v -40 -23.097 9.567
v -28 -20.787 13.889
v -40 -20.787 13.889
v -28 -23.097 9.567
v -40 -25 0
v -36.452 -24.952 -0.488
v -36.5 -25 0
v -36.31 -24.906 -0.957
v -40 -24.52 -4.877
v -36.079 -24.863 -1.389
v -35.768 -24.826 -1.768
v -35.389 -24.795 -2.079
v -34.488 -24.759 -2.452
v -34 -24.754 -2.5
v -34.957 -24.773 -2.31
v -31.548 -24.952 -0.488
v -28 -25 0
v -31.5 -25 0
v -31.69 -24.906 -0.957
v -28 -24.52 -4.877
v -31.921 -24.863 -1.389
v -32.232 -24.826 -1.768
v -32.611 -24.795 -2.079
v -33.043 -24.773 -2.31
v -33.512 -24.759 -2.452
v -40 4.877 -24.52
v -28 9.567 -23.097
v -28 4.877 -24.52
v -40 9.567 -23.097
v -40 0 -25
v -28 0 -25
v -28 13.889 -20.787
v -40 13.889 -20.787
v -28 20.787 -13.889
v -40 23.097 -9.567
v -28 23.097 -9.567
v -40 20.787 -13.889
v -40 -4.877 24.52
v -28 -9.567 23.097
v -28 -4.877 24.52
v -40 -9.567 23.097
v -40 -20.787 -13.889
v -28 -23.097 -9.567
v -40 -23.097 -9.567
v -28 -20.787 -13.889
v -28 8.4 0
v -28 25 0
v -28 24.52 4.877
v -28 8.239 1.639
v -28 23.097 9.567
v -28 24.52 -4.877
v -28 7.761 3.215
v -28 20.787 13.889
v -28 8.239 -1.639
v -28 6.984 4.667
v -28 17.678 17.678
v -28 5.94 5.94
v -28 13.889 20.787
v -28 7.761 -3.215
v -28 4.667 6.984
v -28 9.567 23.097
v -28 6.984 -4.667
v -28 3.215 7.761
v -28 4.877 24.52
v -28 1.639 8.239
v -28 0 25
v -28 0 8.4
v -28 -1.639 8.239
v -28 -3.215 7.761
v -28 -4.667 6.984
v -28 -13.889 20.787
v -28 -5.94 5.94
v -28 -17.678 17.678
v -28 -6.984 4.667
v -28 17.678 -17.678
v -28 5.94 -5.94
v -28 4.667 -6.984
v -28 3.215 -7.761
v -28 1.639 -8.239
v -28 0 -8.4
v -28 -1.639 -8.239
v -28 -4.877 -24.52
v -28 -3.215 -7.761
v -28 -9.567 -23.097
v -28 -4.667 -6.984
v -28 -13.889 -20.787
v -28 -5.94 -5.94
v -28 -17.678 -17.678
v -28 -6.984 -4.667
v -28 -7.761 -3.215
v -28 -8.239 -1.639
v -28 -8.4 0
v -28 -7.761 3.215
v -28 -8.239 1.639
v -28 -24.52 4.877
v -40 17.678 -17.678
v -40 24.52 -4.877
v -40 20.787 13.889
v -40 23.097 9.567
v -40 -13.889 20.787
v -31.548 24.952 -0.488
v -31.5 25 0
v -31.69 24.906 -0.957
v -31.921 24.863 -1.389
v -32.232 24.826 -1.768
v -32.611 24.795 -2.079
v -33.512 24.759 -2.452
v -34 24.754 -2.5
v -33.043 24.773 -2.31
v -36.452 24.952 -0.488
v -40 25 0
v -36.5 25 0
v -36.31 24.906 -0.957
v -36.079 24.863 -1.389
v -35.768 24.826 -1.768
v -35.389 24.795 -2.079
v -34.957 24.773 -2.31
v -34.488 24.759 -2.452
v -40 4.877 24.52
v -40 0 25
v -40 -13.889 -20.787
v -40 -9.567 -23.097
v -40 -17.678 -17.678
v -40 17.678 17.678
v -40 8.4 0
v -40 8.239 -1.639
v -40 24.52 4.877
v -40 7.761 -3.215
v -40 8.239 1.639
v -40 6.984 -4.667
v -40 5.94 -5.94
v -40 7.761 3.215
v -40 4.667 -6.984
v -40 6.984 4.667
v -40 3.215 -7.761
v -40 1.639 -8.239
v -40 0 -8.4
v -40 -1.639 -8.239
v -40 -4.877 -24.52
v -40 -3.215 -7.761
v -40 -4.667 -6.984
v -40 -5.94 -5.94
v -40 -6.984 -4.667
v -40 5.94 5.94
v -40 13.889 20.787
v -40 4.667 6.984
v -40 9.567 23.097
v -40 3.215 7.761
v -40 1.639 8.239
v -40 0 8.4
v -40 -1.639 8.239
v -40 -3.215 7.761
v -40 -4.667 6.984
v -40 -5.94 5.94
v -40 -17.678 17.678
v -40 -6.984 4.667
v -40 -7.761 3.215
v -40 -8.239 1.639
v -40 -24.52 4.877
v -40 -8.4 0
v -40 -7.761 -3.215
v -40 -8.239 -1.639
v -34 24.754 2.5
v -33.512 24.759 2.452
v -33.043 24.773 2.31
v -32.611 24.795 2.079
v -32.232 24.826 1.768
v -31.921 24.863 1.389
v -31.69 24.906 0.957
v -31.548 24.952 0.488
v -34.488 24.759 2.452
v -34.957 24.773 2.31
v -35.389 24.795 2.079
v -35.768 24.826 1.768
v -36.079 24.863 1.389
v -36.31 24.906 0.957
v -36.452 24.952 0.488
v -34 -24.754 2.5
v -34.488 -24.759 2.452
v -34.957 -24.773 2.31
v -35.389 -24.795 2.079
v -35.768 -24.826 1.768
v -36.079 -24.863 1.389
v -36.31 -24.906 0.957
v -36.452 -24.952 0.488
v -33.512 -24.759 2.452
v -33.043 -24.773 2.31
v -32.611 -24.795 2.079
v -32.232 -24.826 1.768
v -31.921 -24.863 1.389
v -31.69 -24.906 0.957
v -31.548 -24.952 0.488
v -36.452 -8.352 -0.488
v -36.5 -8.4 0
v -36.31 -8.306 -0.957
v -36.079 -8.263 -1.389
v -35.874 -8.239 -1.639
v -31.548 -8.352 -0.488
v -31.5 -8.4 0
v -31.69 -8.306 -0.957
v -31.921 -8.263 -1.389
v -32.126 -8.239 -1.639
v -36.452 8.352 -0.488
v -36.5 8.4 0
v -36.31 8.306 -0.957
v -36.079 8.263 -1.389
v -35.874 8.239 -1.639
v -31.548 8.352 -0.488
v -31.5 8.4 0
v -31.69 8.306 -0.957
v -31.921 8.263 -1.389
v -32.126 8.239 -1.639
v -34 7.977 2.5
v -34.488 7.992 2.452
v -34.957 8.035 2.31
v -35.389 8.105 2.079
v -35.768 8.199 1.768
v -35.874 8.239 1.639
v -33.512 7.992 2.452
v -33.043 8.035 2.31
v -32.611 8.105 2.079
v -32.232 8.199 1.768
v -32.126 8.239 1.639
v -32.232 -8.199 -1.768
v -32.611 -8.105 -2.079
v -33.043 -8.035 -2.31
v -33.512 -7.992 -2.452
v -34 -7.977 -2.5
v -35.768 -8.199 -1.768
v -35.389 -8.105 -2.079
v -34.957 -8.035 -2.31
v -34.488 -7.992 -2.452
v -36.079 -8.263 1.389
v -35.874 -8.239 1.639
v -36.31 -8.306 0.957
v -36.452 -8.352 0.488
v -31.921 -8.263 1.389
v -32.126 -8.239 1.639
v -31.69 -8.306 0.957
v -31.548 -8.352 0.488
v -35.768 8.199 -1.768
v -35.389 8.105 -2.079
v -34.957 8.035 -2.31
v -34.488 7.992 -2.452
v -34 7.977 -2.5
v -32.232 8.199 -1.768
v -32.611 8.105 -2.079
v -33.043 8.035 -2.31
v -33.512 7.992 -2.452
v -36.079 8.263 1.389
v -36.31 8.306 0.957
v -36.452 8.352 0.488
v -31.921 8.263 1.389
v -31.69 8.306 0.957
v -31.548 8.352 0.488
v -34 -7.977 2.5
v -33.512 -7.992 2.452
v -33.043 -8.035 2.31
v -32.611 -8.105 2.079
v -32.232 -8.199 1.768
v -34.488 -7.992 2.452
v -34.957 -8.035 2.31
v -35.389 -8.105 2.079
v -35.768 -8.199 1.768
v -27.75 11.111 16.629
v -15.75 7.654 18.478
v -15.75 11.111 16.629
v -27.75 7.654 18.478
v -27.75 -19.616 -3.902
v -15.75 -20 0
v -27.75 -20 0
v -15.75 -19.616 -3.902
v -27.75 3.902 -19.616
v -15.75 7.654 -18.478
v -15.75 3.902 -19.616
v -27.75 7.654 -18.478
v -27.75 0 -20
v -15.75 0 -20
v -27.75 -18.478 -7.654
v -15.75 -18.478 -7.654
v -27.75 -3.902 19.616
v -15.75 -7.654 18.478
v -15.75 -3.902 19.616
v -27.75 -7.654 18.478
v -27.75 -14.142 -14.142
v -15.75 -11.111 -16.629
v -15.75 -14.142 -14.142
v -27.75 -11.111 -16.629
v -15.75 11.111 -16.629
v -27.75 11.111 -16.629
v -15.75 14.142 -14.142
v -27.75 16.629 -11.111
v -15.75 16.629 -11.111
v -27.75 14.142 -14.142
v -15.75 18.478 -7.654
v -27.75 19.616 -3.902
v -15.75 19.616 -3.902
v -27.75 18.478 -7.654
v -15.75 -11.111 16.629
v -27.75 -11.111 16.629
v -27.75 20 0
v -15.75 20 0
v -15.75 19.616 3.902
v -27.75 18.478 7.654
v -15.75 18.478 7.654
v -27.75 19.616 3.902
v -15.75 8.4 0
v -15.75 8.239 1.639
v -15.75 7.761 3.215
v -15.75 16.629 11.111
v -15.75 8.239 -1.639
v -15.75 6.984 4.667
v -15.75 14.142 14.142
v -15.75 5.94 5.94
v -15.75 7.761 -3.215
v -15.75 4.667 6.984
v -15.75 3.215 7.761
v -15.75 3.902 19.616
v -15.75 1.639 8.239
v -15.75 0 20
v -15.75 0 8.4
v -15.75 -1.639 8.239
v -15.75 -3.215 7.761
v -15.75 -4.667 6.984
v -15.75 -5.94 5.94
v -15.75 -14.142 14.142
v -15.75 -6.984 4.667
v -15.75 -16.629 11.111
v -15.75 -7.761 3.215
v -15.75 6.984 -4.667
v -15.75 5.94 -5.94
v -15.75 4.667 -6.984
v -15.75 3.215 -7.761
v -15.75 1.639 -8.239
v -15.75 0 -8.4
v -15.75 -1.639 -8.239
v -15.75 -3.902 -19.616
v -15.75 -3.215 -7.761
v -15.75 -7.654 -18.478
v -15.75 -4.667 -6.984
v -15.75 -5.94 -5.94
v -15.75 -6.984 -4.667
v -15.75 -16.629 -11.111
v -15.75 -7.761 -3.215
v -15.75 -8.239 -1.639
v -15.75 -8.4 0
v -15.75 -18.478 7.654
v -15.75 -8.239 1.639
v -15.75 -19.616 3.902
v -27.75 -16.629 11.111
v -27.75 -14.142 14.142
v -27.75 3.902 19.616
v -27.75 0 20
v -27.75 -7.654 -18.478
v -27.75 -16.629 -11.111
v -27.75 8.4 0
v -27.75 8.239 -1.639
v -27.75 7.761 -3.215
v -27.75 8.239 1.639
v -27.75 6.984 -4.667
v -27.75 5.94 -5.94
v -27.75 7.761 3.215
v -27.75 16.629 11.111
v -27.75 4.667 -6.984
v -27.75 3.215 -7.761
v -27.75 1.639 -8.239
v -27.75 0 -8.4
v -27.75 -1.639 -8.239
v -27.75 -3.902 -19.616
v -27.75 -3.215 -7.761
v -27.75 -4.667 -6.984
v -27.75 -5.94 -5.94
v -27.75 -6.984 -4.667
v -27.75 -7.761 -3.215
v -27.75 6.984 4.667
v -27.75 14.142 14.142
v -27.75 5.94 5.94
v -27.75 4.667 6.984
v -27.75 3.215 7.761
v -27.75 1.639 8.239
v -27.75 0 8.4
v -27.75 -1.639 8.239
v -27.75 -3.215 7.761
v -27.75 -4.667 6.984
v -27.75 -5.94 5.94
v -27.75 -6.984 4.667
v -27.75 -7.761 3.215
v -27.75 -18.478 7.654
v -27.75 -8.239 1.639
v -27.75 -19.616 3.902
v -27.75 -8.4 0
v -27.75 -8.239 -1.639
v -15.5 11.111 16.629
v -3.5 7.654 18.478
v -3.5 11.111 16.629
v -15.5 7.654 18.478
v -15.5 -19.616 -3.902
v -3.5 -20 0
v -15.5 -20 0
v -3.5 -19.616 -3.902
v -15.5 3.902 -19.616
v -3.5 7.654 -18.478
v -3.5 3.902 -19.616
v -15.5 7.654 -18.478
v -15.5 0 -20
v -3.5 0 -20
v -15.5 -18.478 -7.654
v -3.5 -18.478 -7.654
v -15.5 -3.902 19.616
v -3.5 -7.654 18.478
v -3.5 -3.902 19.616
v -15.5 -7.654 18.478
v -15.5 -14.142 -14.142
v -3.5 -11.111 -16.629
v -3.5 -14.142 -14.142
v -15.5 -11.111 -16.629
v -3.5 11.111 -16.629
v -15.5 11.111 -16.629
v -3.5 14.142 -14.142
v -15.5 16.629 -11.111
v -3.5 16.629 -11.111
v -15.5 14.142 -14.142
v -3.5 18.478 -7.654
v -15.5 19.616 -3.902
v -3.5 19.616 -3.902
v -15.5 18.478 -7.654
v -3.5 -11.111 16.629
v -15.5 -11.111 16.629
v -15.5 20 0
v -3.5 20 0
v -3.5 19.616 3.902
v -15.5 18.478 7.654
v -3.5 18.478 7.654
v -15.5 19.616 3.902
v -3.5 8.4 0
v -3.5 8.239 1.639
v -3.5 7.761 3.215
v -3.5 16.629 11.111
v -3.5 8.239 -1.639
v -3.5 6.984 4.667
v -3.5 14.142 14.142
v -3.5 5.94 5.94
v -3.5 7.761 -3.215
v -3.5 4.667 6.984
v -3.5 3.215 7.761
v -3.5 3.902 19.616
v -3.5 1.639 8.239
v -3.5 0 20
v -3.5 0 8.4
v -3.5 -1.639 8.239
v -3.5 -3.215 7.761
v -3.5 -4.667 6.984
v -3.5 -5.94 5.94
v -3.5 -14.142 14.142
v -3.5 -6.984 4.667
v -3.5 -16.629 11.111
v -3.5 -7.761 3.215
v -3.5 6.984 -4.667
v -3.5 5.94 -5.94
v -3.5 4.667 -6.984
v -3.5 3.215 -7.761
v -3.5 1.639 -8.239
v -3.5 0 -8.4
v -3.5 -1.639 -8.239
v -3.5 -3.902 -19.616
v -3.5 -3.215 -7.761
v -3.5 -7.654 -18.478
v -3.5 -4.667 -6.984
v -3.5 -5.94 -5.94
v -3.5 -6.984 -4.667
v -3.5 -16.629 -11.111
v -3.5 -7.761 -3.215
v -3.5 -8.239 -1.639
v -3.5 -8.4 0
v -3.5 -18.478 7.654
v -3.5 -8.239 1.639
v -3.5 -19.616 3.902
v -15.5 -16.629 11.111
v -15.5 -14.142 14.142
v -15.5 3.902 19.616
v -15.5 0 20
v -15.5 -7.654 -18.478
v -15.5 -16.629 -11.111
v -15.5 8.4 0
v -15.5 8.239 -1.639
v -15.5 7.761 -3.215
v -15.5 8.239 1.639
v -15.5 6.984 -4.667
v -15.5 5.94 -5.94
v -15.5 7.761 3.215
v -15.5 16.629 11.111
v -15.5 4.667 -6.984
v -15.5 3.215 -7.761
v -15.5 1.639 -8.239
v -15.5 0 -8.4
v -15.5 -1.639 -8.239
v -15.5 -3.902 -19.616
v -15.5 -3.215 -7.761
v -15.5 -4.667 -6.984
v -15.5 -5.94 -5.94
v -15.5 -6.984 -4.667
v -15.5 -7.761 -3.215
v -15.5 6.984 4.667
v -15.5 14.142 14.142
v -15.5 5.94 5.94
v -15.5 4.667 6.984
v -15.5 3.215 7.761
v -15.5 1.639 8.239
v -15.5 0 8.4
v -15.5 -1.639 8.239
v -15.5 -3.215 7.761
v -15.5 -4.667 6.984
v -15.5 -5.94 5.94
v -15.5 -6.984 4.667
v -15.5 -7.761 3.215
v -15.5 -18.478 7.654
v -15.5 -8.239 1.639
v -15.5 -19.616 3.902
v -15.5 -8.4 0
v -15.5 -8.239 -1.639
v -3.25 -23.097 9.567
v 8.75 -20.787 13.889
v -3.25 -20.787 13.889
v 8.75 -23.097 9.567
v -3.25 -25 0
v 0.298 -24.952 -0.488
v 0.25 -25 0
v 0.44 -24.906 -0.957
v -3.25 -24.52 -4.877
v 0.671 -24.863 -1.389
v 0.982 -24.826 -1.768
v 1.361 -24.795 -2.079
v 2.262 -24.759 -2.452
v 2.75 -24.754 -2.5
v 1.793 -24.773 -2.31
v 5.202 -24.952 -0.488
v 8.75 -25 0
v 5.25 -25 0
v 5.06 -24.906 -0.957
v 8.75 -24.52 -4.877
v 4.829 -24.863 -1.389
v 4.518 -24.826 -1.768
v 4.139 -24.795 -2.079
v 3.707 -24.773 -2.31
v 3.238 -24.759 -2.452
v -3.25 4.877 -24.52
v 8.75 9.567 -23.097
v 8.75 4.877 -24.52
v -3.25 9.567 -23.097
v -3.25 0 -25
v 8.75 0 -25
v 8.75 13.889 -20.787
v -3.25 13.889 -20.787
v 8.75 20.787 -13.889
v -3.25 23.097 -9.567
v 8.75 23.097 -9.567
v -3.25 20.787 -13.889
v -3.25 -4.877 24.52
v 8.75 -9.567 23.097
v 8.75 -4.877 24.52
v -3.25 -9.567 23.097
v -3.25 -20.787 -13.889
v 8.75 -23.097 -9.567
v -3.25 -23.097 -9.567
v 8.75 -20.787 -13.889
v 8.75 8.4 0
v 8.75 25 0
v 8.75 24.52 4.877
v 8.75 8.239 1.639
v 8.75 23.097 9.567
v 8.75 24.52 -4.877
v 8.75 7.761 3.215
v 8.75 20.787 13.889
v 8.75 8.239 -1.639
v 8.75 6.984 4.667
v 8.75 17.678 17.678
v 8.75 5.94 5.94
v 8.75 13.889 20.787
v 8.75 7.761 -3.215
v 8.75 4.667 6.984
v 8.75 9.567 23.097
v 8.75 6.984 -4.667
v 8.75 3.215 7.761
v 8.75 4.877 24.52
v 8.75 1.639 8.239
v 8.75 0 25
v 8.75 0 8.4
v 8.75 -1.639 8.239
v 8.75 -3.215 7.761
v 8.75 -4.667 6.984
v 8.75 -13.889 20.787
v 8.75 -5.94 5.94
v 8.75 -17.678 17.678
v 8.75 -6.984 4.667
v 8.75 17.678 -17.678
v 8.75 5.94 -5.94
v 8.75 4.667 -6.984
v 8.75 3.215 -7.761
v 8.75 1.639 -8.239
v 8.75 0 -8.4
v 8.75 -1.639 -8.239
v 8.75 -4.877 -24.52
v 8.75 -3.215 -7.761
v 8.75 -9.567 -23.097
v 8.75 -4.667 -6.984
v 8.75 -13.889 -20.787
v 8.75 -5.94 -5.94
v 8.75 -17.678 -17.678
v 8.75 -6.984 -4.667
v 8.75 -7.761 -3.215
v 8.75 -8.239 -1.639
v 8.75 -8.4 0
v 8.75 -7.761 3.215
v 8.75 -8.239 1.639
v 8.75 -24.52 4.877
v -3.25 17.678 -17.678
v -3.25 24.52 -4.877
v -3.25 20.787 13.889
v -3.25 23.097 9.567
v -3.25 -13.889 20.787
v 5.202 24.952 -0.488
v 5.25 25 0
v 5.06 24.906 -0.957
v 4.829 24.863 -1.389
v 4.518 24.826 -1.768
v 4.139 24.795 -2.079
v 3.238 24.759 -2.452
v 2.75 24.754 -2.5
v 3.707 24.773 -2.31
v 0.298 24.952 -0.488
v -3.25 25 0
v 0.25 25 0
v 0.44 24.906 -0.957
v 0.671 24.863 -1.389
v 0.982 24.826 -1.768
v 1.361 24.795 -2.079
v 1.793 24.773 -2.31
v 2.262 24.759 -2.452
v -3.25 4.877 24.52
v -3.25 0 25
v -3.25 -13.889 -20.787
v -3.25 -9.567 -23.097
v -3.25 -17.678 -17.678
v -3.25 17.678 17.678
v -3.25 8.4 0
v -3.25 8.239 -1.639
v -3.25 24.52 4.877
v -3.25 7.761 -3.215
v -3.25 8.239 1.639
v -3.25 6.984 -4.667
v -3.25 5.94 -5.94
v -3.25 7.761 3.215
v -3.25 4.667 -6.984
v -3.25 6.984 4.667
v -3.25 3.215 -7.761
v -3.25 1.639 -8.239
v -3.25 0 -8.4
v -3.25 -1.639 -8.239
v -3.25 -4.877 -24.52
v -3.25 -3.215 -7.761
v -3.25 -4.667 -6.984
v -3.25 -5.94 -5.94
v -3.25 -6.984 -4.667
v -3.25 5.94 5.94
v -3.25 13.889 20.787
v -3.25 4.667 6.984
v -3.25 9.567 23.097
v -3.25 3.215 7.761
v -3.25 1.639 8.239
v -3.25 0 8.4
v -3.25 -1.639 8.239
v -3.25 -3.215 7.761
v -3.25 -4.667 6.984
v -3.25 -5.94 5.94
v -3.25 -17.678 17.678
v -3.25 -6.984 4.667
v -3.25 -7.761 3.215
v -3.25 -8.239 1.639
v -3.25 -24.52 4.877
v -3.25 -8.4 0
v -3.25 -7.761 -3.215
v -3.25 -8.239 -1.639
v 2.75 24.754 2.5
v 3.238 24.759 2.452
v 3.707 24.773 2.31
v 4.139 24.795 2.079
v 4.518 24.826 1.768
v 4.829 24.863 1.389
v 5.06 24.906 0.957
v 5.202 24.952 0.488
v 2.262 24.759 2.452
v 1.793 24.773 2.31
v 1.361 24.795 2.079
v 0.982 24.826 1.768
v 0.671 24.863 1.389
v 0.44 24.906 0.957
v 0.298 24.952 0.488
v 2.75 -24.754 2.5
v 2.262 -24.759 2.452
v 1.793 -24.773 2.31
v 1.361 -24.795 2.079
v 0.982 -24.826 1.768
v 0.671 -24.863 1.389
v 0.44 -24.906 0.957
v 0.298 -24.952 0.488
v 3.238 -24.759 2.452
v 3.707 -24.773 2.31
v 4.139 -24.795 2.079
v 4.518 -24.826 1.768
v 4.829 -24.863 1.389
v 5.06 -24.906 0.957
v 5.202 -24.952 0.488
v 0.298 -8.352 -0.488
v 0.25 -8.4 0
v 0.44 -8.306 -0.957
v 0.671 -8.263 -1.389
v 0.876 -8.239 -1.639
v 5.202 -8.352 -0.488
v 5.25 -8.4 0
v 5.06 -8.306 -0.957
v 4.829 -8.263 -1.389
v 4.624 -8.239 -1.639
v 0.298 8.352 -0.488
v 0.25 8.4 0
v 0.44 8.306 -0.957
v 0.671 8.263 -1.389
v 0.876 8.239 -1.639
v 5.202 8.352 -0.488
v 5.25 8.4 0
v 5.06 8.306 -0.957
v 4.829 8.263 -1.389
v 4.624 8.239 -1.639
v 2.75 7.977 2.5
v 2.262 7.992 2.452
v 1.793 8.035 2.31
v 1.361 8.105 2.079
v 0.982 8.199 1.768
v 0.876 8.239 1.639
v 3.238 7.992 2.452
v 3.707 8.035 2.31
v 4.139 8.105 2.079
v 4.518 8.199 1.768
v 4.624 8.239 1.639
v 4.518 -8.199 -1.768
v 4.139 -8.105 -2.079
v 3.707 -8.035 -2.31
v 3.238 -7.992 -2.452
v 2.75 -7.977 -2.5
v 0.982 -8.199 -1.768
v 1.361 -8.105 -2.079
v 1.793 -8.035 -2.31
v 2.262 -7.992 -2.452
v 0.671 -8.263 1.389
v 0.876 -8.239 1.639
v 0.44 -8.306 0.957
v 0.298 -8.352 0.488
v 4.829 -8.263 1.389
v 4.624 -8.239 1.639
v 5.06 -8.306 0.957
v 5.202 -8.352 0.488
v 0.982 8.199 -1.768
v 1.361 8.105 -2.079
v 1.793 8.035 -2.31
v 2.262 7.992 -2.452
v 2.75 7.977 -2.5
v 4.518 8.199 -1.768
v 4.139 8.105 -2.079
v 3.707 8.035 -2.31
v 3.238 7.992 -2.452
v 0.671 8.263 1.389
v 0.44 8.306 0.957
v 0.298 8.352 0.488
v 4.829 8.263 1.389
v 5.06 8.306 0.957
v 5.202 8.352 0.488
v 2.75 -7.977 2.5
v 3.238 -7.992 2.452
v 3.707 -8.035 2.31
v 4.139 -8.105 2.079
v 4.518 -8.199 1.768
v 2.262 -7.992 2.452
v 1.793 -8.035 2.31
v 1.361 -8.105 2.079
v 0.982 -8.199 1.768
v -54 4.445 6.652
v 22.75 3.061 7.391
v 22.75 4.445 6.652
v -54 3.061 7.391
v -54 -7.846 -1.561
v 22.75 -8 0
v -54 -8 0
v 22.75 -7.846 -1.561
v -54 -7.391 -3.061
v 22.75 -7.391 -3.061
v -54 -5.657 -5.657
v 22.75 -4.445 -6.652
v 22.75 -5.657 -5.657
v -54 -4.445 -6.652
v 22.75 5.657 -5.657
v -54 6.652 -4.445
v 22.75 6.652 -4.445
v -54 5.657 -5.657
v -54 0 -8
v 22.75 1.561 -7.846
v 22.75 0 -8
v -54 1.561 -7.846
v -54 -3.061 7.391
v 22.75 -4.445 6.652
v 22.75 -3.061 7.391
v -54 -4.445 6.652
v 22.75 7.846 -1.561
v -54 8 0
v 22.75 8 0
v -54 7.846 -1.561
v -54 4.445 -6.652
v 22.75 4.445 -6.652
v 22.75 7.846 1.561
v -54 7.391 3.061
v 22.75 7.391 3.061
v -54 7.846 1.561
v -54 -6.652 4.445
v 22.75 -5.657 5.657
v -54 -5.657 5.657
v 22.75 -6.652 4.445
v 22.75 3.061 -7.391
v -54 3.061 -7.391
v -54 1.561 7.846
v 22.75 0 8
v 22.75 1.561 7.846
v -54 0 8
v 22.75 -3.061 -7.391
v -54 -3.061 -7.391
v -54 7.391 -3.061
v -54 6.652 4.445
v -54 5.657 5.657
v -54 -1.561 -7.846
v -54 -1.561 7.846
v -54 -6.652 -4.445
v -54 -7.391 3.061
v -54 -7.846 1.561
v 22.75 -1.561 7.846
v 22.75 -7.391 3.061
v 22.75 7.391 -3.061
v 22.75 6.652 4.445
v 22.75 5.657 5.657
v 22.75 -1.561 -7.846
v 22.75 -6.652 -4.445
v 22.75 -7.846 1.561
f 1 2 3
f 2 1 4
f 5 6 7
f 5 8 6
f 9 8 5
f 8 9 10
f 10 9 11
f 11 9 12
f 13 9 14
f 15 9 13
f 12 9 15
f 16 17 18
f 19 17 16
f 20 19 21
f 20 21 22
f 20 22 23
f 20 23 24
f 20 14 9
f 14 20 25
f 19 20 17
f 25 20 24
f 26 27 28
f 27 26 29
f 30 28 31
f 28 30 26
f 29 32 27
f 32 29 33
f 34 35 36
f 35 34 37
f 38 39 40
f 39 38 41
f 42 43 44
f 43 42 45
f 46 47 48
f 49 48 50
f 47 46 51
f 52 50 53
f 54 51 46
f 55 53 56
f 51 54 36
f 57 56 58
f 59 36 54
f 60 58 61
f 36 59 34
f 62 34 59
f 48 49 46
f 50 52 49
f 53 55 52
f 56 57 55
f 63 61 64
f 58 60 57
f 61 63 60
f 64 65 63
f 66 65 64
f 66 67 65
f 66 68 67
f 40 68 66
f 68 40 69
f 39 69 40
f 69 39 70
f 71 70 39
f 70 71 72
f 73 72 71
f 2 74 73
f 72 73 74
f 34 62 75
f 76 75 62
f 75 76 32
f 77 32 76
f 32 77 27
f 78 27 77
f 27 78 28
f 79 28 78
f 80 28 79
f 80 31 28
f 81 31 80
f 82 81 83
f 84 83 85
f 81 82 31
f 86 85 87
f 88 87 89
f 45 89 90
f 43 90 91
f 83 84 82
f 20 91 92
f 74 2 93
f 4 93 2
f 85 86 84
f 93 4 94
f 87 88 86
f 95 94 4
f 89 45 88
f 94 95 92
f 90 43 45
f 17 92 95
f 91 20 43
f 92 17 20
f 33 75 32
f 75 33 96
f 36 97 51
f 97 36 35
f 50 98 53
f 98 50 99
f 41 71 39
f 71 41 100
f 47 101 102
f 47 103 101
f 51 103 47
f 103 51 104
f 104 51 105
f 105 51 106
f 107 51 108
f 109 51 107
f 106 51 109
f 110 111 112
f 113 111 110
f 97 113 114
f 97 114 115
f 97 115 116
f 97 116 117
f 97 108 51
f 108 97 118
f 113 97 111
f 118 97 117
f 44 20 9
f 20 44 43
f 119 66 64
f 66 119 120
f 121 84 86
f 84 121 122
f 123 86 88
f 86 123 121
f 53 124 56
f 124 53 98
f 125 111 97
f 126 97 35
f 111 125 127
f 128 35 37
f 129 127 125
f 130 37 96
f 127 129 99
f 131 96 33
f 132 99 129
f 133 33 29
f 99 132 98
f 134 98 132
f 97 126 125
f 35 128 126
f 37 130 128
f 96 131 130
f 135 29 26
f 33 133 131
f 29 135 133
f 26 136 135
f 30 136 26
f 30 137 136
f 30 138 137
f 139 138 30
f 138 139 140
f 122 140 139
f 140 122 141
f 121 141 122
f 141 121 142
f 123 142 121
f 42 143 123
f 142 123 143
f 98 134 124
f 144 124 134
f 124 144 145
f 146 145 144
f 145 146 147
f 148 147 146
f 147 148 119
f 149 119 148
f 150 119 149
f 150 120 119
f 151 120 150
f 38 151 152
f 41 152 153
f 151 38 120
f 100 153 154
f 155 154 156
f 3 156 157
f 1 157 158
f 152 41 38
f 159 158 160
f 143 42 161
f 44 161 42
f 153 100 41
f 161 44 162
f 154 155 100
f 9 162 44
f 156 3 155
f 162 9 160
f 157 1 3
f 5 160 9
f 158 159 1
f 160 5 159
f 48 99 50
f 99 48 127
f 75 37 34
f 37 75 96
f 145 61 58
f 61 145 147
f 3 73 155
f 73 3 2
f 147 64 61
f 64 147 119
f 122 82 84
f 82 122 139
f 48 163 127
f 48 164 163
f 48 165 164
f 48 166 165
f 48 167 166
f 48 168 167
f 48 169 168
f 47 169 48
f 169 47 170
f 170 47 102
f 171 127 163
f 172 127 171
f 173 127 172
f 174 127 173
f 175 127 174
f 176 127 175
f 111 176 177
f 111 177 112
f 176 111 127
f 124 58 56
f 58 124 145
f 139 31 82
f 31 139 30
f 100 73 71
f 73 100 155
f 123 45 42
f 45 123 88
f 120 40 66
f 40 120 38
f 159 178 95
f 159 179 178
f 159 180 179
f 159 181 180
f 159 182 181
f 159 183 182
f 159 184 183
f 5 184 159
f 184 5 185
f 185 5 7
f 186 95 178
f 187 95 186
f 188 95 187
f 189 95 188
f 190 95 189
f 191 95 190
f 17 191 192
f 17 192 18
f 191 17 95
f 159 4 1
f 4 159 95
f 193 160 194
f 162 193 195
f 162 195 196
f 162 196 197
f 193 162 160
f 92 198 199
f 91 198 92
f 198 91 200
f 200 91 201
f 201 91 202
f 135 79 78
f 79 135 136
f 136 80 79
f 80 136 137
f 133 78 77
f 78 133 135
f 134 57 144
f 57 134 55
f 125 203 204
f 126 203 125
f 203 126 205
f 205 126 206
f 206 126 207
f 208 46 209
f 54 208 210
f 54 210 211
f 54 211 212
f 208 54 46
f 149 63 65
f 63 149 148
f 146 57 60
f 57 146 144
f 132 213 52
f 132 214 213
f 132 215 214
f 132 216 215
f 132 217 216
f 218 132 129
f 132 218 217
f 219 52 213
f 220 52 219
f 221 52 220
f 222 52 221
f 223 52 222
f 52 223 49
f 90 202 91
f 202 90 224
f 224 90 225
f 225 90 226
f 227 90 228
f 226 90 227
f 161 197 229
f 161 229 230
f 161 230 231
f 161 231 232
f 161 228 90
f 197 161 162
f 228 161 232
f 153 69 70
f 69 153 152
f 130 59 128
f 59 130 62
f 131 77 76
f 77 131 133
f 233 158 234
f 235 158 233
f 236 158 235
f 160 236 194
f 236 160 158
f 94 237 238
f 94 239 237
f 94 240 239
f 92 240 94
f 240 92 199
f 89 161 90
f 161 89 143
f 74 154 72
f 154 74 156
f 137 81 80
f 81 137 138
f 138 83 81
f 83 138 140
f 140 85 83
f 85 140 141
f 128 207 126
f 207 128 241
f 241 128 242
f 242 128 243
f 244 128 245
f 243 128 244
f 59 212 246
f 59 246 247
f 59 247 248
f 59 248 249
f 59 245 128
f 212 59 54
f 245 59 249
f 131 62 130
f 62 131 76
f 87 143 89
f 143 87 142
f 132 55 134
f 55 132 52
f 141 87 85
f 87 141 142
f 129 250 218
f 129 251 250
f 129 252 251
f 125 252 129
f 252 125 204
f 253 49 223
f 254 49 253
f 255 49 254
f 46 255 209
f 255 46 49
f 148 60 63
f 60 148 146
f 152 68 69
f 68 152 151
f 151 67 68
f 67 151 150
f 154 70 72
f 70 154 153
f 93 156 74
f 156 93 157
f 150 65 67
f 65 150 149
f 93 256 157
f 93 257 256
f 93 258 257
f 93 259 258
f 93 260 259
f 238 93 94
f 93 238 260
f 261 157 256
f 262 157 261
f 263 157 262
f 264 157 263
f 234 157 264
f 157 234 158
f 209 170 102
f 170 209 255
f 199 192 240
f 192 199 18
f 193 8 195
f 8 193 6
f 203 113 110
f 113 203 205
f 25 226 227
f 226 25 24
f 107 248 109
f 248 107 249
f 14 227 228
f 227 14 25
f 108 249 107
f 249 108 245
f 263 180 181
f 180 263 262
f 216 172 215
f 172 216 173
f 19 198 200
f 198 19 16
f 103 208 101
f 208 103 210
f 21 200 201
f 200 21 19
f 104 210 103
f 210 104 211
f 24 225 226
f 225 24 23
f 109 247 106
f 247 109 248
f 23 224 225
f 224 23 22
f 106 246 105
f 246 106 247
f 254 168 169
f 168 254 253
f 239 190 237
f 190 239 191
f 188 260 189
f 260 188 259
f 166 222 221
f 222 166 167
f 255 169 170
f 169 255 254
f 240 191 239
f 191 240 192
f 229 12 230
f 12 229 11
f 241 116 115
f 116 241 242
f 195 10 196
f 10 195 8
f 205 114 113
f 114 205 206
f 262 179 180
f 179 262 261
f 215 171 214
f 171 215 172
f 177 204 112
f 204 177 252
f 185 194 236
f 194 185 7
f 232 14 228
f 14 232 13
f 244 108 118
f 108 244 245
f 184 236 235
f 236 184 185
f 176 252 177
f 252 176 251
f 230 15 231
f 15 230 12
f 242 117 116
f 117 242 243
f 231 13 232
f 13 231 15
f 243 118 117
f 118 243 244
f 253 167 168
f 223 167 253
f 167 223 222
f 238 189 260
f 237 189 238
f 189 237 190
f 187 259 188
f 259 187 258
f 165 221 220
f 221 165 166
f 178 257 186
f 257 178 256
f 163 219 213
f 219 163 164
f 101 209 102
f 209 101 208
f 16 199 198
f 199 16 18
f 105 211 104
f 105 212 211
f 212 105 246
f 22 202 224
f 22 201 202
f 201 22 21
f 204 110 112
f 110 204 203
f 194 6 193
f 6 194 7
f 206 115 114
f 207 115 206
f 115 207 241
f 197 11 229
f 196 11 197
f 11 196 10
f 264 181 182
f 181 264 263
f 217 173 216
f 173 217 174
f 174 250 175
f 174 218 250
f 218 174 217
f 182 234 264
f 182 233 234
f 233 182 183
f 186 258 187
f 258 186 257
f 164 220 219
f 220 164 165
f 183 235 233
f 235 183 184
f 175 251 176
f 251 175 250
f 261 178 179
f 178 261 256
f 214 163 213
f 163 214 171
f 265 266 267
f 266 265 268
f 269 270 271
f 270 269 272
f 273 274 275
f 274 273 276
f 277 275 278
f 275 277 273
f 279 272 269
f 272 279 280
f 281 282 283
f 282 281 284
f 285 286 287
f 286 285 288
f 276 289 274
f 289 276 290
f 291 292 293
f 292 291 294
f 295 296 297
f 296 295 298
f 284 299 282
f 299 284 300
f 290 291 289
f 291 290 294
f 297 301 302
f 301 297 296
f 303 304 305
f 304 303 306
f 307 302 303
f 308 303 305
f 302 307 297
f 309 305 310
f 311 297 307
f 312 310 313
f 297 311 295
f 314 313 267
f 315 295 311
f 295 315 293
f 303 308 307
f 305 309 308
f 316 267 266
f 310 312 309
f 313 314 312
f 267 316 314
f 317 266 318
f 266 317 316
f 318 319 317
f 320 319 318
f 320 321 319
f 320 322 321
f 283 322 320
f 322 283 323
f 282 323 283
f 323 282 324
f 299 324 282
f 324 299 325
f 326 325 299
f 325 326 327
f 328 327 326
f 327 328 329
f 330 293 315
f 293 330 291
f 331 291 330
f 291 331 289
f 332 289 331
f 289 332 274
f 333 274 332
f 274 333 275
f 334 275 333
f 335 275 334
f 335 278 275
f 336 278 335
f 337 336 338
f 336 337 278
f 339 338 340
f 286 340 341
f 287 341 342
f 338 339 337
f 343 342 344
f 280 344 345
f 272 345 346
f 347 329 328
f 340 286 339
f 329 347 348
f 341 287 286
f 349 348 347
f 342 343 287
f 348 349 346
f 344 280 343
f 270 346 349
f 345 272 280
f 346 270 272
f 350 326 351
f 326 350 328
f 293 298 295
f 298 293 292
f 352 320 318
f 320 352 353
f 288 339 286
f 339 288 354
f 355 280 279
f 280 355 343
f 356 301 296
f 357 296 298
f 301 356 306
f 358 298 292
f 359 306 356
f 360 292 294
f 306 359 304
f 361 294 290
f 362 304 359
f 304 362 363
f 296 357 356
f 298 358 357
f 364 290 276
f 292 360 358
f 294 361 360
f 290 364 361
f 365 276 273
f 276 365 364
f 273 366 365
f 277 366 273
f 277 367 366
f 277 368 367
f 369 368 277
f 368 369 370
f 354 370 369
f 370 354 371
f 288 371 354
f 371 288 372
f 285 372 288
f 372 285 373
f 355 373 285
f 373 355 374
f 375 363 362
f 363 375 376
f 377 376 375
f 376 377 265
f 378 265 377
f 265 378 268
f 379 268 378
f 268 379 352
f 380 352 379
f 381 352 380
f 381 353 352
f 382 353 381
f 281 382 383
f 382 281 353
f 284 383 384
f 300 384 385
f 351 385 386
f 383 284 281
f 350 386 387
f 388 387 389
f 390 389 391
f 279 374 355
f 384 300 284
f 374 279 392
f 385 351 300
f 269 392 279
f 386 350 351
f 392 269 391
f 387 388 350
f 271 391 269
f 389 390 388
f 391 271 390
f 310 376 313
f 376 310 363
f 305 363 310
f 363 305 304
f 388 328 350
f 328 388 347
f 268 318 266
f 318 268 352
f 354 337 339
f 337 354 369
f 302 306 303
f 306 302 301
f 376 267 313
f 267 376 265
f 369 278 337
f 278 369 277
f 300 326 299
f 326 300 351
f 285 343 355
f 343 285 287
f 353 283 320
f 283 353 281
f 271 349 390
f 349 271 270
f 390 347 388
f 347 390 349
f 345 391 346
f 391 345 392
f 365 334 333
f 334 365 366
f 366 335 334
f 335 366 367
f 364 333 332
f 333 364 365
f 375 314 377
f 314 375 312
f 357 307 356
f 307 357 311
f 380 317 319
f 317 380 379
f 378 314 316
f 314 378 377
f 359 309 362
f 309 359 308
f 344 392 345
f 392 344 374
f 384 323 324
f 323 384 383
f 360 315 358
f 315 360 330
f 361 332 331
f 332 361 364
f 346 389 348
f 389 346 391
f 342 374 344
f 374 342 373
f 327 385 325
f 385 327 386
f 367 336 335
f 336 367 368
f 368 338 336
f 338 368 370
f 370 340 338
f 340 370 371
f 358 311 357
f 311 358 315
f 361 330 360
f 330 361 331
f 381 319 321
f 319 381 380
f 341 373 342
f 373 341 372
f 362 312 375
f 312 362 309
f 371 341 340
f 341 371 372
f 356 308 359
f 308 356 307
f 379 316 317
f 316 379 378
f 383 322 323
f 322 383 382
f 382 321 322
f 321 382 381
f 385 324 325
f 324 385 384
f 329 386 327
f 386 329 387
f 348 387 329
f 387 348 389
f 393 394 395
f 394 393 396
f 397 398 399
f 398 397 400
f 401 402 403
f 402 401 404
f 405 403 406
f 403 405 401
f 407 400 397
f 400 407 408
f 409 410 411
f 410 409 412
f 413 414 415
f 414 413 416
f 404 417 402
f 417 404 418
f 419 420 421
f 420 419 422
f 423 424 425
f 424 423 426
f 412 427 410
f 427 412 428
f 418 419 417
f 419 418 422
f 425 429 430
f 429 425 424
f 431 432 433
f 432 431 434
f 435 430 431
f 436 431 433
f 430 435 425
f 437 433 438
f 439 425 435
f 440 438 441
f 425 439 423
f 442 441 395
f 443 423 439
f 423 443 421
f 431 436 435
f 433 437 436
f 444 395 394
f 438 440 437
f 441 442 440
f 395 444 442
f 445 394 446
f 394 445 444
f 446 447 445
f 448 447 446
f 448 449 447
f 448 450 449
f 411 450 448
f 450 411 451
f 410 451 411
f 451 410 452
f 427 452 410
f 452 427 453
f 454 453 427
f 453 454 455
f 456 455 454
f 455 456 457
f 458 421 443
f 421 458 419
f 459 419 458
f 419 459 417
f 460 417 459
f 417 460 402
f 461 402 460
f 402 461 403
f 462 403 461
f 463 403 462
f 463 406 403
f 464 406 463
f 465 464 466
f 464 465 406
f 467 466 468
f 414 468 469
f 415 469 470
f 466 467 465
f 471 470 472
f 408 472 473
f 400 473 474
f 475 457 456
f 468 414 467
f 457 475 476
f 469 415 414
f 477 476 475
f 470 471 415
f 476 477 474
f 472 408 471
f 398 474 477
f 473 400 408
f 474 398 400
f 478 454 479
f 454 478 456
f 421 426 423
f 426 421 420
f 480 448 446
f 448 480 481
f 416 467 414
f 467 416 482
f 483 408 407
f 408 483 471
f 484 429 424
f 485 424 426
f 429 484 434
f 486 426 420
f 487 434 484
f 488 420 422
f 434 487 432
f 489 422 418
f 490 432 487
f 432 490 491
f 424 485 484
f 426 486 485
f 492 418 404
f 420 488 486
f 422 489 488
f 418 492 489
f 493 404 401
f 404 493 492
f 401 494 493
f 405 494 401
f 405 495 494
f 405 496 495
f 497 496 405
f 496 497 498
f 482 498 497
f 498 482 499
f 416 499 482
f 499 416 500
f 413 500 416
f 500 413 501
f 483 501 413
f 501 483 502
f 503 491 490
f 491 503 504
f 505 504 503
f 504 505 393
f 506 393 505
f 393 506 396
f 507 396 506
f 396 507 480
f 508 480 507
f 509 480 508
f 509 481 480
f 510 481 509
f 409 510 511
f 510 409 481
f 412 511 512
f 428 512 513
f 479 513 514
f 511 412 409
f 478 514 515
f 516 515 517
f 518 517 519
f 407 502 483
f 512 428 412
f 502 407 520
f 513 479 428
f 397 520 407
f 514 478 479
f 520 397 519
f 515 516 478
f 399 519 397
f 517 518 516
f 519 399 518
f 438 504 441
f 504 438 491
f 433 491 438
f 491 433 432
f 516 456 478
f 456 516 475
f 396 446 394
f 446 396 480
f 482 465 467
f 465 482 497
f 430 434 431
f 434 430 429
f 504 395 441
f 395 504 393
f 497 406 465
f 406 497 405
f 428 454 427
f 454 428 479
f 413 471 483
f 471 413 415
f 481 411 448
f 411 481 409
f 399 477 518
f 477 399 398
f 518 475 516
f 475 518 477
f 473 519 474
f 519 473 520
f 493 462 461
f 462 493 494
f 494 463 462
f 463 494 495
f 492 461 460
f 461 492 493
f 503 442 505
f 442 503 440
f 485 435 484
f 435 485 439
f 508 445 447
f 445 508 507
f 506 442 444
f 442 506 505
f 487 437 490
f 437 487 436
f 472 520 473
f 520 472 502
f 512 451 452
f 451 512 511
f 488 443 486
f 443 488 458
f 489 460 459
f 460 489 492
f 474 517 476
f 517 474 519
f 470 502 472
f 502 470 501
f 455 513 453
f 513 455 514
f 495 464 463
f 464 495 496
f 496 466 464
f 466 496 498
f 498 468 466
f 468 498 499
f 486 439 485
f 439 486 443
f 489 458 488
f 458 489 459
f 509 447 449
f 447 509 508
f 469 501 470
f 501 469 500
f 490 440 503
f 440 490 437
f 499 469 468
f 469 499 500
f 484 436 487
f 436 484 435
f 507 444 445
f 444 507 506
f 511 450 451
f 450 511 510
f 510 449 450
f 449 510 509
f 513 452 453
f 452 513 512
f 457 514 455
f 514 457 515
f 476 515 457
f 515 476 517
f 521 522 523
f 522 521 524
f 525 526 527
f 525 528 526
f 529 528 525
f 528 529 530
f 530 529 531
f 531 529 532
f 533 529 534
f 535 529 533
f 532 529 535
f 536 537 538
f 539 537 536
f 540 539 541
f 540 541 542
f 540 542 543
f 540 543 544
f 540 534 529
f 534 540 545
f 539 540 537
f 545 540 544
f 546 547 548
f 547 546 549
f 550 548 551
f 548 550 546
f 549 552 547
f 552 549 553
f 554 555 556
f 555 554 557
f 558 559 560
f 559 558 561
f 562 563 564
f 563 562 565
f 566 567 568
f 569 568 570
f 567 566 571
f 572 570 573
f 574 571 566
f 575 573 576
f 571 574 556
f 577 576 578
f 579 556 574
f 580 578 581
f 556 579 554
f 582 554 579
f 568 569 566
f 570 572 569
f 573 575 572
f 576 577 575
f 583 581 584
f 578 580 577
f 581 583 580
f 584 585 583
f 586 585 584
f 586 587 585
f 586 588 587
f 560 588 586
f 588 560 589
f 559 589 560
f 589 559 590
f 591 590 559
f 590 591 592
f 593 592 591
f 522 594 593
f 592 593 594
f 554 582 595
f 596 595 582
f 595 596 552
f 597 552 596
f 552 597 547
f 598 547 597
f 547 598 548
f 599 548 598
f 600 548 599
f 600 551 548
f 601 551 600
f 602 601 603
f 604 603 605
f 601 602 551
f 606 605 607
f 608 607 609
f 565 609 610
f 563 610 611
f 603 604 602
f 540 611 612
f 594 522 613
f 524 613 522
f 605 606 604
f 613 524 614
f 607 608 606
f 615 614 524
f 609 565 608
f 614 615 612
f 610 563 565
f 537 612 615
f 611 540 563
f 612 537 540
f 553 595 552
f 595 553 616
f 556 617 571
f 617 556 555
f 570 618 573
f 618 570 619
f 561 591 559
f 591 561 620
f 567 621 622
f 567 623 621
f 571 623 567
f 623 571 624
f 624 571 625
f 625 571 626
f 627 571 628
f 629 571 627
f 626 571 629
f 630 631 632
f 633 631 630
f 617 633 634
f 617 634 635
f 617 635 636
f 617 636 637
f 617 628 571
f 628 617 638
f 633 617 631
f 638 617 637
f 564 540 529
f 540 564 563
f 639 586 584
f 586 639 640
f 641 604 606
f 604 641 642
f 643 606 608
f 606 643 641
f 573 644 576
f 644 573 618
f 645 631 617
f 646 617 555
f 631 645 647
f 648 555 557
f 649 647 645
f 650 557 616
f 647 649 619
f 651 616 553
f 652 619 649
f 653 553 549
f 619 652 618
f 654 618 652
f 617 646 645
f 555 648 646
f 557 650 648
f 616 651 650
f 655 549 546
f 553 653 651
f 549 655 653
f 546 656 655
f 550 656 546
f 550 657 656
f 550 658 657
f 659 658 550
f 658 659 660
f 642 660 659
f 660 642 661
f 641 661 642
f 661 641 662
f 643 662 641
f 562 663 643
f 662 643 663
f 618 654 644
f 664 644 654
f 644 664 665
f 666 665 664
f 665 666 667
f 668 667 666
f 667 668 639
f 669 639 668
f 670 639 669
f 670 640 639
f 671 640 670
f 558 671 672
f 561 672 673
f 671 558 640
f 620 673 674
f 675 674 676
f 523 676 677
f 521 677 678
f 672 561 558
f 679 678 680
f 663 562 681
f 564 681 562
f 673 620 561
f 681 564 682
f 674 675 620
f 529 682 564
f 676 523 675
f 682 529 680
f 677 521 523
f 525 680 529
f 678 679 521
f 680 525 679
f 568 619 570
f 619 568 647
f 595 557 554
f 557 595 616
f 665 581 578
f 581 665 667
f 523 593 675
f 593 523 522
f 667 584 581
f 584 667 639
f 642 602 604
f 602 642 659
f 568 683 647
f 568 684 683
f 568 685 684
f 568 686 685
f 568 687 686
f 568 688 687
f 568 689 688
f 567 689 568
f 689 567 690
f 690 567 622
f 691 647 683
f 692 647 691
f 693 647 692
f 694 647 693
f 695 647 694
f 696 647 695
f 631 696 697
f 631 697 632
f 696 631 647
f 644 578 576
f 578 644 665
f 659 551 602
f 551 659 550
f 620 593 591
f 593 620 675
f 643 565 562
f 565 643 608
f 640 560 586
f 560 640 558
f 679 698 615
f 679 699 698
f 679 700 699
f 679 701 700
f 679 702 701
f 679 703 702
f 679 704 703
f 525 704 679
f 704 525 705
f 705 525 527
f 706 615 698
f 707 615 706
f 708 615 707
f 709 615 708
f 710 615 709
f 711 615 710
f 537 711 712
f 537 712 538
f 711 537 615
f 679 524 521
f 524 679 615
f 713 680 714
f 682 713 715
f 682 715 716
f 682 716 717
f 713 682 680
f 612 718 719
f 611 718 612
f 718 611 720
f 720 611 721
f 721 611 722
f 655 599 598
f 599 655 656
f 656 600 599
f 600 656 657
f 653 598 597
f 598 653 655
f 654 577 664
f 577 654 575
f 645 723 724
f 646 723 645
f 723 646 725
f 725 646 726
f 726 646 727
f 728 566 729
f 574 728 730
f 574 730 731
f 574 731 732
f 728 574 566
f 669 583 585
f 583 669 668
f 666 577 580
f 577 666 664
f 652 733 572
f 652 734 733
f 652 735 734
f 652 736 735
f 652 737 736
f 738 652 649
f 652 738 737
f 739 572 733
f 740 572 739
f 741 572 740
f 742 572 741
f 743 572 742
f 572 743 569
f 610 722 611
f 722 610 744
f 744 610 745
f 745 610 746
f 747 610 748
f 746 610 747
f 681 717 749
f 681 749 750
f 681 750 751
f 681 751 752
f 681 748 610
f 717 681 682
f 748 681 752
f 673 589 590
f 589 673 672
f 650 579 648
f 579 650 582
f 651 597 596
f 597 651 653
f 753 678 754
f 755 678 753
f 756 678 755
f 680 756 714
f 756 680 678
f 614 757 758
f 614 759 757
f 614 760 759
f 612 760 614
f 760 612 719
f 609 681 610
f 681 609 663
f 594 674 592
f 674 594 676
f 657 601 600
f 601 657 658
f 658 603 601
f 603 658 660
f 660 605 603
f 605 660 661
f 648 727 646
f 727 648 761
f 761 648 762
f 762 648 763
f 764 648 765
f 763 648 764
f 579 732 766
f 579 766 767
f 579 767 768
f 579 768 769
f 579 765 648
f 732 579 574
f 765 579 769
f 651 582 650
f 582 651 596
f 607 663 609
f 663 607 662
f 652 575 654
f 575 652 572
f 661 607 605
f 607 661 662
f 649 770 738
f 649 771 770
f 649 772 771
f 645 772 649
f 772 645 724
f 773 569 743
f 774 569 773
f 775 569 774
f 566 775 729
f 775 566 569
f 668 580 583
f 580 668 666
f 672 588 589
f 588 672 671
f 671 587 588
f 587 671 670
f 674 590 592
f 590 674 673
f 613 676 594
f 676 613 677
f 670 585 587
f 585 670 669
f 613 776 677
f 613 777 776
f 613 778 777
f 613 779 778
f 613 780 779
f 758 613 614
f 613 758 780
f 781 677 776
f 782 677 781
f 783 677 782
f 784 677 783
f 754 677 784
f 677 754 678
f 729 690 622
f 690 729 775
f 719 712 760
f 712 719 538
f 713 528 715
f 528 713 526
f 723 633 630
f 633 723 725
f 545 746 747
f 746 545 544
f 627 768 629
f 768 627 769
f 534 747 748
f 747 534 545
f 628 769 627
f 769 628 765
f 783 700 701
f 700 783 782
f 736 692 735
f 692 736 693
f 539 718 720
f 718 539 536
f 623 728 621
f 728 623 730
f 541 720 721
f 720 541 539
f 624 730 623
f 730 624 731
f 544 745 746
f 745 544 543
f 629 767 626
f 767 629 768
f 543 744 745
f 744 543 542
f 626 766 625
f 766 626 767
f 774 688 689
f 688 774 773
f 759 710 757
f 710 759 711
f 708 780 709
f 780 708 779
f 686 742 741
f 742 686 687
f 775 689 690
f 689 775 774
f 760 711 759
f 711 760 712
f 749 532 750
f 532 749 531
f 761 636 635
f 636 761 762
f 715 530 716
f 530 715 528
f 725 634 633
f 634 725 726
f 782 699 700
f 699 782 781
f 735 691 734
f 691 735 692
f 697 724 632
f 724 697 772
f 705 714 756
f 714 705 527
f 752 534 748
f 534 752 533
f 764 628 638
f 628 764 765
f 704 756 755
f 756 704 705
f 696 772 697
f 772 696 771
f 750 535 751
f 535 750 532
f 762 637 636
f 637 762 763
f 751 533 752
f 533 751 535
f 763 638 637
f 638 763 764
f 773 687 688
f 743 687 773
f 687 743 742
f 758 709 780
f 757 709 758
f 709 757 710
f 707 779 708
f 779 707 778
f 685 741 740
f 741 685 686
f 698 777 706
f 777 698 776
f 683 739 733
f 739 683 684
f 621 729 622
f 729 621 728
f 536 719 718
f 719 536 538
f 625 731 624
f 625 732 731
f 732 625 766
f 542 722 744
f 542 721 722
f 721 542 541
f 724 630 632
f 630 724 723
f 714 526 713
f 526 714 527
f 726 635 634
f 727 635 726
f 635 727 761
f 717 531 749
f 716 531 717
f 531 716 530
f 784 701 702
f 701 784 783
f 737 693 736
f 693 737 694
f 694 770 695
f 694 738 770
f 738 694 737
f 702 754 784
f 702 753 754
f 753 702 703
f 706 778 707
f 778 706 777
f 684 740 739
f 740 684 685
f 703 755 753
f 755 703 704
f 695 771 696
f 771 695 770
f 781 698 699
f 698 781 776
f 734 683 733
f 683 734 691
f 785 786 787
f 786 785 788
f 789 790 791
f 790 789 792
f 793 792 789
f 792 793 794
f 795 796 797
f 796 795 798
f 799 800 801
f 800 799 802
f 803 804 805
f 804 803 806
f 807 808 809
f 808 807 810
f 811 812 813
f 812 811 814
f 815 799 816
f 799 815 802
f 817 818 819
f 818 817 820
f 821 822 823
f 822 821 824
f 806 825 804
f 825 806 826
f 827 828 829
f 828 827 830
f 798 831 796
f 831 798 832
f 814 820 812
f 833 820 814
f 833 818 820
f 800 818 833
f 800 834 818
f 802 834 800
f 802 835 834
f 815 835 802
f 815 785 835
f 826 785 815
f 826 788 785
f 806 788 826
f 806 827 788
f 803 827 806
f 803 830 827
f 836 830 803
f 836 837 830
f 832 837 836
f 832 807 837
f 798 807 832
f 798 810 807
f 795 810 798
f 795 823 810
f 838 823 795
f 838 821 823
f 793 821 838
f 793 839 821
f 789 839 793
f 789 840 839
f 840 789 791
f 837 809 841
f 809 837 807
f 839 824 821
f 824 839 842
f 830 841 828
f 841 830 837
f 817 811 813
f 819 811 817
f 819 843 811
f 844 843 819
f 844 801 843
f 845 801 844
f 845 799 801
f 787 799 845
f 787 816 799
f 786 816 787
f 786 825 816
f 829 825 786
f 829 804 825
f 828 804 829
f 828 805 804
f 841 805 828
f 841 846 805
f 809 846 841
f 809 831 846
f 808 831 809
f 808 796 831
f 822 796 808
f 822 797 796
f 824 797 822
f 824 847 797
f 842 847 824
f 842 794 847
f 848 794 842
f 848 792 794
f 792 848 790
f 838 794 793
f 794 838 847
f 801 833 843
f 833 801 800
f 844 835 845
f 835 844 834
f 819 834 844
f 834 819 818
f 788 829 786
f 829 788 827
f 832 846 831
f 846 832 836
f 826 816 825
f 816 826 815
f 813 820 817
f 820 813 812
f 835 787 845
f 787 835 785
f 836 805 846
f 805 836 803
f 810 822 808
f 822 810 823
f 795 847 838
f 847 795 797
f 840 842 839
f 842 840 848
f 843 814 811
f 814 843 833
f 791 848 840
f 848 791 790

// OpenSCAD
$fn = 32;

// ------------------------------------------------------------------------
// Shaft with rings and collars: d16 shaft, 4 rings
// Every part is its own module, assembly() places them once.
// ------------------------------------------------------------------------

// --- part 1 ---
module shaft() {
  translate([0, 0, -38.375]) cylinder(h = 76.75, d = 16);
}

// --- part 2 ---
module collar_a() {
  difference() {
    cylinder(h = 12, d = 50);
    translate([0, 0, -1]) cylinder(h = 14, d = 16.8);
    translate([0, 0, 6]) rotate([90, 0, 0]) cylinder(h = 52, d = 5, center = true);
  }
}

// --- part 3 ---
module spacer_a() {
  difference() {
      translate([0, 0, 0]) cylinder(h = 12, d = 40);
      translate([0, 0, -1]) cylinder(h = 14, d = 16.8);
    }
}

// --- part 4 ---
module spacer_b() {
  difference() {
      translate([0, 0, 0]) cylinder(h = 12, d = 40);
      translate([0, 0, -1]) cylinder(h = 14, d = 16.8);
    }
}

// --- part 5 ---
module collar_b() {
  difference() {
    cylinder(h = 12, d = 50);
    translate([0, 0, -1]) cylinder(h = 14, d = 16.8);
    translate([0, 0, 6]) rotate([90, 0, 0]) cylinder(h = 52, d = 5, center = true);
  }
}

// --- assembly ---
module assembly() {
  translate([-15.625, 0, 0]) rotate([0, 90, 0]) shaft();
  translate([-40, 0, 0]) rotate([0, 90, 0]) collar_a();
  translate([-27.75, 0, 0]) rotate([0, 90, 0]) spacer_a();
  translate([-15.5, 0, 0]) rotate([0, 90, 0]) spacer_b();
  translate([-3.25, 0, 0]) rotate([0, 90, 0]) collar_b();
}

assembly();
